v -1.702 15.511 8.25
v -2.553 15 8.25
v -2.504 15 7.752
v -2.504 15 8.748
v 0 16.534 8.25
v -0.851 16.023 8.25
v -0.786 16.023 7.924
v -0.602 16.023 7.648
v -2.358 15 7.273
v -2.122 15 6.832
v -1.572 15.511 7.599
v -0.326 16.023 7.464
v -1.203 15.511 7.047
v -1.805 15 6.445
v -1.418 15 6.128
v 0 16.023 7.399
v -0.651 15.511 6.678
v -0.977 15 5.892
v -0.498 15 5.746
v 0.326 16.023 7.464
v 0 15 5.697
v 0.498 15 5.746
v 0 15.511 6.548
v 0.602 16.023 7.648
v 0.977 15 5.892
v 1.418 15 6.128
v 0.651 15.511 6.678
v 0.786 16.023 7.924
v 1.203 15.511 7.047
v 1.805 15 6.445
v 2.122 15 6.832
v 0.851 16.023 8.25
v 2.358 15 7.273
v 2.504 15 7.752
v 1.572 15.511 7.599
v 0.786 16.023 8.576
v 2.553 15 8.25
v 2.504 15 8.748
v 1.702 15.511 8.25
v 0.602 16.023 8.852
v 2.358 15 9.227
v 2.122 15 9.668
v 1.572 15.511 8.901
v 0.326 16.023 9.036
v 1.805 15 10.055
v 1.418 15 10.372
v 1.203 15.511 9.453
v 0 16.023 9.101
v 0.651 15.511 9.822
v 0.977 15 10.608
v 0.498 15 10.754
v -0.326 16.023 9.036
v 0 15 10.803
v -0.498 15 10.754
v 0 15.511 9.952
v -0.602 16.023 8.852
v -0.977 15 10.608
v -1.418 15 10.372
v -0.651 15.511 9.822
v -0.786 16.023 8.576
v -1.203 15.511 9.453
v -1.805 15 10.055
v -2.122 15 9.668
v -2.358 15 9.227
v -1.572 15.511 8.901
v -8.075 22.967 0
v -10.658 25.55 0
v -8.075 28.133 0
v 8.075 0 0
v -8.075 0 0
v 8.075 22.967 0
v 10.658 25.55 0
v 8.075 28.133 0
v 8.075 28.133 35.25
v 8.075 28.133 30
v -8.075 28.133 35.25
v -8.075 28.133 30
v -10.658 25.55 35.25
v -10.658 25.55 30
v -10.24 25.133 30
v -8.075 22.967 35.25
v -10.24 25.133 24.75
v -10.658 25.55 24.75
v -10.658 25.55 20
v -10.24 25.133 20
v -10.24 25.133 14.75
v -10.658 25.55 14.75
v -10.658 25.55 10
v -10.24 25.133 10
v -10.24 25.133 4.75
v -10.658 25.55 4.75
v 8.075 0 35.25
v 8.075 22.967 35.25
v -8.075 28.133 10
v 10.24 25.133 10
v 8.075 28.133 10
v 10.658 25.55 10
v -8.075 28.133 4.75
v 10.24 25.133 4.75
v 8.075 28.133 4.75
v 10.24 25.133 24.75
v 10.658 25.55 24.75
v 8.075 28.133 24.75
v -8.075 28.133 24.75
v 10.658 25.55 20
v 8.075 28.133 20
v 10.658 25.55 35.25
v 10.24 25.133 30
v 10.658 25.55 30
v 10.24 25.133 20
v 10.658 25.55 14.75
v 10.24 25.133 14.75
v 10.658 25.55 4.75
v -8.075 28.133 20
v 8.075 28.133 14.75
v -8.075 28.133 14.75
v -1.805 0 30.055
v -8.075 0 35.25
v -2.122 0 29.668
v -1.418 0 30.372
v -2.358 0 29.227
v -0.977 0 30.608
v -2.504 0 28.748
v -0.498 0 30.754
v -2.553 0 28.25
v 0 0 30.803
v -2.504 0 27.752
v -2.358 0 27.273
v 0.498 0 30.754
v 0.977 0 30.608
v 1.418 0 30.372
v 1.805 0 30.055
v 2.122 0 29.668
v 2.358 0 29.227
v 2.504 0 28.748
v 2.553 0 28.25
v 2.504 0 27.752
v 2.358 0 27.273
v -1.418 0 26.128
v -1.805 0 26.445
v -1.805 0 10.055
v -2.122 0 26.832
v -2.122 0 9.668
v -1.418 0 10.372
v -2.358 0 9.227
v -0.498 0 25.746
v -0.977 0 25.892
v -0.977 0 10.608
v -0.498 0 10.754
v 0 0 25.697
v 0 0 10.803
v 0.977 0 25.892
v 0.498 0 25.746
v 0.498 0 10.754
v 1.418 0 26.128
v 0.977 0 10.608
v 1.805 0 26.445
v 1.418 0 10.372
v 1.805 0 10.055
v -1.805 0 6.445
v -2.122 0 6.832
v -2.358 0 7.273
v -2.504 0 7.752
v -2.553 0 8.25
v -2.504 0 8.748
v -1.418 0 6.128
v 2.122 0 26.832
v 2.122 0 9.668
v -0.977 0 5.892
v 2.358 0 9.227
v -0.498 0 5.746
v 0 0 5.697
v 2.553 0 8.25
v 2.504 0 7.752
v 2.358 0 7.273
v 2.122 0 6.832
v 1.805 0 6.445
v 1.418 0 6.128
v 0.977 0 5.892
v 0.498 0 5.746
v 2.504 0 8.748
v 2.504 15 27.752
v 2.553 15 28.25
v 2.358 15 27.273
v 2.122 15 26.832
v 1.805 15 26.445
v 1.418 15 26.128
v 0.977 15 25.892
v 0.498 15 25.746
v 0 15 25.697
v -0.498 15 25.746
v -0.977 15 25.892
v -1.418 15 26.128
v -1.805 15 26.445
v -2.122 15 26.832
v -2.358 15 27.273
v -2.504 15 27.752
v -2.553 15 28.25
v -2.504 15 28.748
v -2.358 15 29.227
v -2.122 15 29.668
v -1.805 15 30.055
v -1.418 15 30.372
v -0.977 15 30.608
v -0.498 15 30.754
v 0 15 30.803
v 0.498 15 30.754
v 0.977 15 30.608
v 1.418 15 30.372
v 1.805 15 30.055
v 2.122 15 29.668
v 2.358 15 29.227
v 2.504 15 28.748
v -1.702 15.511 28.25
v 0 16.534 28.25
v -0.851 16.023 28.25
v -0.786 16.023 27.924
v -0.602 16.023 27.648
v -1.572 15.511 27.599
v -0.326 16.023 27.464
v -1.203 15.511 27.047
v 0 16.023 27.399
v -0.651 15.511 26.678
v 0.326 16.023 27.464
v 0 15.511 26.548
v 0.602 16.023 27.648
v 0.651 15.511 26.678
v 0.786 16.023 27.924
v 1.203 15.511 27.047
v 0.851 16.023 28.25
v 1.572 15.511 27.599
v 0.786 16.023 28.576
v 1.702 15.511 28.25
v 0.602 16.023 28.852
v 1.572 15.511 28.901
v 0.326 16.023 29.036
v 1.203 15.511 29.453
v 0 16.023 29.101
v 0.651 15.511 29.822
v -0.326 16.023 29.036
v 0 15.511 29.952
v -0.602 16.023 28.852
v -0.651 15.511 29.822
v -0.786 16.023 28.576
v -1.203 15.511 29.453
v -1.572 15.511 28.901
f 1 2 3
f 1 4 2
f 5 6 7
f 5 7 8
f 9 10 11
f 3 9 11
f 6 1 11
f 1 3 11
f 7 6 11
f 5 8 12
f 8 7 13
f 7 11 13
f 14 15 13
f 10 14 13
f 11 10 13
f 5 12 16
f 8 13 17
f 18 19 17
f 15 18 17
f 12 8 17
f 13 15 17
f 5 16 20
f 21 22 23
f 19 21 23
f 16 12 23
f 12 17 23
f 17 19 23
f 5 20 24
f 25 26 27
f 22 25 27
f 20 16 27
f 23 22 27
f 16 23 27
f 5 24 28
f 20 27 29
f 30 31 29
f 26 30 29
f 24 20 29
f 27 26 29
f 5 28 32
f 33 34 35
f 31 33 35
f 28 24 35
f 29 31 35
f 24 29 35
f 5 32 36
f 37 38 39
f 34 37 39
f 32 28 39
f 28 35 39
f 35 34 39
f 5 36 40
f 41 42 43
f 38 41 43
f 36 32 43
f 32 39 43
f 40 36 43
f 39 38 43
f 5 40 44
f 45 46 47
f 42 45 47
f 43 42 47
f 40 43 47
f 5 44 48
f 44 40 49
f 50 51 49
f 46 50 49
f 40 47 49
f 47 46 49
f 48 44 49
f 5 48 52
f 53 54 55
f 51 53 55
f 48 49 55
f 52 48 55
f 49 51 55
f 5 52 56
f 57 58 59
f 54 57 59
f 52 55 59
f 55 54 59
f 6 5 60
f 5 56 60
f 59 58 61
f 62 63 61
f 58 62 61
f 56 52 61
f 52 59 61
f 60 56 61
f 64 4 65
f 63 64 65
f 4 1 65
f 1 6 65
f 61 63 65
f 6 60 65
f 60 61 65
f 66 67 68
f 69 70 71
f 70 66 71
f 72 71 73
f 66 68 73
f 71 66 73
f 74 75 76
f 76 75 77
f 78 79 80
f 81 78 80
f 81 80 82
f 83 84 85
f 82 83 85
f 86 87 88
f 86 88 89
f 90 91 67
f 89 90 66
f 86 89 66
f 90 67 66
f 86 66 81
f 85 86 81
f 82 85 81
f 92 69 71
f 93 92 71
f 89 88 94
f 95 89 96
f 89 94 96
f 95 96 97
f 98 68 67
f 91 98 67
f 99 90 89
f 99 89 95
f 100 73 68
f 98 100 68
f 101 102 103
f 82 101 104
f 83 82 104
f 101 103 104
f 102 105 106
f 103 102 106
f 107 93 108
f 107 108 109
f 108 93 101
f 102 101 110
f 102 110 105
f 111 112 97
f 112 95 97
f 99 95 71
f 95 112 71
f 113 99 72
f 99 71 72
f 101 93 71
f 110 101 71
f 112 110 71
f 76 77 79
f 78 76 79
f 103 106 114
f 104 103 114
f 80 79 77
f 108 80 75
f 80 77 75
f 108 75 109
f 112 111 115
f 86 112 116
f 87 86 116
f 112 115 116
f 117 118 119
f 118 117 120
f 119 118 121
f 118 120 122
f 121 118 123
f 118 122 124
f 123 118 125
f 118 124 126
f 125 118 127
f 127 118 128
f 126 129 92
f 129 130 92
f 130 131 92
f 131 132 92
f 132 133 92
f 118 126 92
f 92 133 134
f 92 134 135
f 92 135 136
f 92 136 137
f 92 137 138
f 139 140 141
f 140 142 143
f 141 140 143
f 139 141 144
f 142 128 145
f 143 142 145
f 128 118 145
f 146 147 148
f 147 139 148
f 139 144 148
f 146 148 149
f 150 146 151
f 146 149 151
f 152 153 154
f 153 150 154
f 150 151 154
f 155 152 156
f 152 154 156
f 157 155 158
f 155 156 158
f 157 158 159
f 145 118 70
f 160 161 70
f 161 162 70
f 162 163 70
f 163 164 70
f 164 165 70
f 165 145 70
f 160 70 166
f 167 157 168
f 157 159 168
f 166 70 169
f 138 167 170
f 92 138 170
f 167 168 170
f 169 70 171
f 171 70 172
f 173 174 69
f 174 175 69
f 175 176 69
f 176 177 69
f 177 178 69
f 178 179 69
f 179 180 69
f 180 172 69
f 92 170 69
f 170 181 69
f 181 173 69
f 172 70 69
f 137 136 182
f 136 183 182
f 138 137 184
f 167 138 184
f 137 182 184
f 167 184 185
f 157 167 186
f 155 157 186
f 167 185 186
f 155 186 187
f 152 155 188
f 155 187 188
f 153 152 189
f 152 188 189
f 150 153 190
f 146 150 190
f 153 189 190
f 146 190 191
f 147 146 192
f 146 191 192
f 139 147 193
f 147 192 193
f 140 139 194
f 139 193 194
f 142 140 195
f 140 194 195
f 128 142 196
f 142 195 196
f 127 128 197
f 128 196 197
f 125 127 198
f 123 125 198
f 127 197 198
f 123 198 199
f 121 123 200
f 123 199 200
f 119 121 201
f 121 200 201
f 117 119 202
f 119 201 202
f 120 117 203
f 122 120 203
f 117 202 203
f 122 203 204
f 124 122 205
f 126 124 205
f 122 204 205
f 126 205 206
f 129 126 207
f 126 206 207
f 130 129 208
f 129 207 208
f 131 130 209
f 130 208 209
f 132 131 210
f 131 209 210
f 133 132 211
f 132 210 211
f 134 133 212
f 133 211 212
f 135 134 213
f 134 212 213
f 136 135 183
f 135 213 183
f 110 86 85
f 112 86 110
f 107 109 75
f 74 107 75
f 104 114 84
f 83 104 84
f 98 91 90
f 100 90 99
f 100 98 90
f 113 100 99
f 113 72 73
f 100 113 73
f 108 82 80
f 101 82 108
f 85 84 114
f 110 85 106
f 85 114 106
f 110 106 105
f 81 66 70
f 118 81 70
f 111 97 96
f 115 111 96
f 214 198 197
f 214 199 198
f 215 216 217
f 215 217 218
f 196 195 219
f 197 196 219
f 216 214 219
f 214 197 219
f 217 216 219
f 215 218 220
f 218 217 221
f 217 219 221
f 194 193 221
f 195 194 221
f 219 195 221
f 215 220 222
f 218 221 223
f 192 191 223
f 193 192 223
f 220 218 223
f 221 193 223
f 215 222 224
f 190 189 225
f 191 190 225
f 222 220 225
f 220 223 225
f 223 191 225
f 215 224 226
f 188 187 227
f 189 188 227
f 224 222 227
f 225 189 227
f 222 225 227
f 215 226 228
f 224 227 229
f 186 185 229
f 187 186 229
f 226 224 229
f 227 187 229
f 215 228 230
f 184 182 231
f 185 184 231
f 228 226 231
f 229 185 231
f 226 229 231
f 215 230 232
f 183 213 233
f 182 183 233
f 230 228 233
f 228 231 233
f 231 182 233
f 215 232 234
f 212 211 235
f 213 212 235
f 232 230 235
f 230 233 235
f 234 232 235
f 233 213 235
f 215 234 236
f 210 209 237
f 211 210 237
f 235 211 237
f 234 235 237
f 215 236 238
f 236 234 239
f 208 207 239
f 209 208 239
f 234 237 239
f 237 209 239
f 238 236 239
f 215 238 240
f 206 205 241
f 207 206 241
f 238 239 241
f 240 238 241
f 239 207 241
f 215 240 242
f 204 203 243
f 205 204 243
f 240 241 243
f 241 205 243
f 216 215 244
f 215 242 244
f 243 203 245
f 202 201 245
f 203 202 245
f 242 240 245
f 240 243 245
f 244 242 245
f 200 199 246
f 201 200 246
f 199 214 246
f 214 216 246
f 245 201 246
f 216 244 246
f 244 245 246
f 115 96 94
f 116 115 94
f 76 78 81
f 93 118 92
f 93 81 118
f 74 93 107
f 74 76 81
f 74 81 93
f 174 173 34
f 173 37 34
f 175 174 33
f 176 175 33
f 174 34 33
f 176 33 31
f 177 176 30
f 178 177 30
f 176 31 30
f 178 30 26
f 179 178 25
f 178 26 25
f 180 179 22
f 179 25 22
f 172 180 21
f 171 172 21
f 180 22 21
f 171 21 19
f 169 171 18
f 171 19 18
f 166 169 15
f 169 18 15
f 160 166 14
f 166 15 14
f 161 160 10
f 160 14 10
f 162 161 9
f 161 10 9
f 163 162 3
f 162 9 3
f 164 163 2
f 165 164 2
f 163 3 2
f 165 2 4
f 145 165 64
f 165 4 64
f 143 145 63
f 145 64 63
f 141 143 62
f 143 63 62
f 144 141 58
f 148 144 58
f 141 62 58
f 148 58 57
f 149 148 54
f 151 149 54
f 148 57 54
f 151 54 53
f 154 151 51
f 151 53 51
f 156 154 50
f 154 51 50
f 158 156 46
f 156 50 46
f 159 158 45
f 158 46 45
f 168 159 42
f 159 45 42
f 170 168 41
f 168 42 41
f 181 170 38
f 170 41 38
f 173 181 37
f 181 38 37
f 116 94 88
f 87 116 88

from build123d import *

# Parameters (mm, degrees)
BOSS_EXTRUDE1_DEPTH         = 35.25
F_1_4_20_TAPPED_HOLE1_D     = 5.1054
F_1_4_20_TAPPED_HOLE1_DEPTH = 15
F_1_4_20_TAPPED_HOLE1_TIP   = 1.533816902
SKETCH4_W                   = 6.24022781
SKETCH4_H                   = 5.25
SKETCH4_W_2                 = 16.14963906
SKETCH4_W_3                 = 28.63009468
CUT_EXTRUDE1_DEPTH          = 3


with BuildPart() as part:
    # Sketch1 → Boss-Extrude1 (new body)
    with BuildSketch(Plane.XY):
        Polygon((-8.07481953, 0), (8.07481953, 0), (8.07481953, 22.9672), (10.65761953, 25.55), (8.07481953, 28.1328), (-8.07481953, 28.1328), (-10.65761953, 25.55), (-8.07481953, 22.9672), align=None)
    extrude(amount=BOSS_EXTRUDE1_DEPTH)

    # 1/4-20 Tapped Hole1
    with Locations(Plane(origin=(0, 0, 0), x_dir=(-1, 0, 0), z_dir=(0, -1, 0))):
        with Locations((0, -8.25), (0, -28.25)):
            Hole(F_1_4_20_TAPPED_HOLE1_D / 2, depth=F_1_4_20_TAPPED_HOLE1_DEPTH)
            with Locations((0, 0, -(F_1_4_20_TAPPED_HOLE1_DEPTH + F_1_4_20_TAPPED_HOLE1_TIP / 2))):  # 118° drill point
                Cone(0, F_1_4_20_TAPPED_HOLE1_D / 2, F_1_4_20_TAPPED_HOLE1_TIP, mode=Mode.SUBTRACT)

    # Sketch4 → Cut-Extrude1 (cut)
    with BuildSketch(Plane(origin=(0, 28.1328, 0), x_dir=(1, 0, 0), z_dir=(0, 1, 0))):
        with Locations((-11.194933435, -17.375)):
            Rectangle(SKETCH4_W, SKETCH4_H)
        with Locations((0, -17.375)):
            Rectangle(SKETCH4_W_2, SKETCH4_H)
        with Locations((11.194933435, -17.375)):
            Rectangle(SKETCH4_W, SKETCH4_H)
        with Locations((-11.194933435, -27.375)):
            Rectangle(SKETCH4_W, SKETCH4_H)
        with Locations((0, -27.375)):
            Rectangle(SKETCH4_W_2, SKETCH4_H)
        with Locations((11.194933435, -27.375)):
            Rectangle(SKETCH4_W, SKETCH4_H)
        with Locations((0, -7.375)):
            Rectangle(SKETCH4_W_3, SKETCH4_H)
    extrude(amount=-CUT_EXTRUDE1_DEPTH, mode=Mode.SUBTRACT)


solid = part.part
